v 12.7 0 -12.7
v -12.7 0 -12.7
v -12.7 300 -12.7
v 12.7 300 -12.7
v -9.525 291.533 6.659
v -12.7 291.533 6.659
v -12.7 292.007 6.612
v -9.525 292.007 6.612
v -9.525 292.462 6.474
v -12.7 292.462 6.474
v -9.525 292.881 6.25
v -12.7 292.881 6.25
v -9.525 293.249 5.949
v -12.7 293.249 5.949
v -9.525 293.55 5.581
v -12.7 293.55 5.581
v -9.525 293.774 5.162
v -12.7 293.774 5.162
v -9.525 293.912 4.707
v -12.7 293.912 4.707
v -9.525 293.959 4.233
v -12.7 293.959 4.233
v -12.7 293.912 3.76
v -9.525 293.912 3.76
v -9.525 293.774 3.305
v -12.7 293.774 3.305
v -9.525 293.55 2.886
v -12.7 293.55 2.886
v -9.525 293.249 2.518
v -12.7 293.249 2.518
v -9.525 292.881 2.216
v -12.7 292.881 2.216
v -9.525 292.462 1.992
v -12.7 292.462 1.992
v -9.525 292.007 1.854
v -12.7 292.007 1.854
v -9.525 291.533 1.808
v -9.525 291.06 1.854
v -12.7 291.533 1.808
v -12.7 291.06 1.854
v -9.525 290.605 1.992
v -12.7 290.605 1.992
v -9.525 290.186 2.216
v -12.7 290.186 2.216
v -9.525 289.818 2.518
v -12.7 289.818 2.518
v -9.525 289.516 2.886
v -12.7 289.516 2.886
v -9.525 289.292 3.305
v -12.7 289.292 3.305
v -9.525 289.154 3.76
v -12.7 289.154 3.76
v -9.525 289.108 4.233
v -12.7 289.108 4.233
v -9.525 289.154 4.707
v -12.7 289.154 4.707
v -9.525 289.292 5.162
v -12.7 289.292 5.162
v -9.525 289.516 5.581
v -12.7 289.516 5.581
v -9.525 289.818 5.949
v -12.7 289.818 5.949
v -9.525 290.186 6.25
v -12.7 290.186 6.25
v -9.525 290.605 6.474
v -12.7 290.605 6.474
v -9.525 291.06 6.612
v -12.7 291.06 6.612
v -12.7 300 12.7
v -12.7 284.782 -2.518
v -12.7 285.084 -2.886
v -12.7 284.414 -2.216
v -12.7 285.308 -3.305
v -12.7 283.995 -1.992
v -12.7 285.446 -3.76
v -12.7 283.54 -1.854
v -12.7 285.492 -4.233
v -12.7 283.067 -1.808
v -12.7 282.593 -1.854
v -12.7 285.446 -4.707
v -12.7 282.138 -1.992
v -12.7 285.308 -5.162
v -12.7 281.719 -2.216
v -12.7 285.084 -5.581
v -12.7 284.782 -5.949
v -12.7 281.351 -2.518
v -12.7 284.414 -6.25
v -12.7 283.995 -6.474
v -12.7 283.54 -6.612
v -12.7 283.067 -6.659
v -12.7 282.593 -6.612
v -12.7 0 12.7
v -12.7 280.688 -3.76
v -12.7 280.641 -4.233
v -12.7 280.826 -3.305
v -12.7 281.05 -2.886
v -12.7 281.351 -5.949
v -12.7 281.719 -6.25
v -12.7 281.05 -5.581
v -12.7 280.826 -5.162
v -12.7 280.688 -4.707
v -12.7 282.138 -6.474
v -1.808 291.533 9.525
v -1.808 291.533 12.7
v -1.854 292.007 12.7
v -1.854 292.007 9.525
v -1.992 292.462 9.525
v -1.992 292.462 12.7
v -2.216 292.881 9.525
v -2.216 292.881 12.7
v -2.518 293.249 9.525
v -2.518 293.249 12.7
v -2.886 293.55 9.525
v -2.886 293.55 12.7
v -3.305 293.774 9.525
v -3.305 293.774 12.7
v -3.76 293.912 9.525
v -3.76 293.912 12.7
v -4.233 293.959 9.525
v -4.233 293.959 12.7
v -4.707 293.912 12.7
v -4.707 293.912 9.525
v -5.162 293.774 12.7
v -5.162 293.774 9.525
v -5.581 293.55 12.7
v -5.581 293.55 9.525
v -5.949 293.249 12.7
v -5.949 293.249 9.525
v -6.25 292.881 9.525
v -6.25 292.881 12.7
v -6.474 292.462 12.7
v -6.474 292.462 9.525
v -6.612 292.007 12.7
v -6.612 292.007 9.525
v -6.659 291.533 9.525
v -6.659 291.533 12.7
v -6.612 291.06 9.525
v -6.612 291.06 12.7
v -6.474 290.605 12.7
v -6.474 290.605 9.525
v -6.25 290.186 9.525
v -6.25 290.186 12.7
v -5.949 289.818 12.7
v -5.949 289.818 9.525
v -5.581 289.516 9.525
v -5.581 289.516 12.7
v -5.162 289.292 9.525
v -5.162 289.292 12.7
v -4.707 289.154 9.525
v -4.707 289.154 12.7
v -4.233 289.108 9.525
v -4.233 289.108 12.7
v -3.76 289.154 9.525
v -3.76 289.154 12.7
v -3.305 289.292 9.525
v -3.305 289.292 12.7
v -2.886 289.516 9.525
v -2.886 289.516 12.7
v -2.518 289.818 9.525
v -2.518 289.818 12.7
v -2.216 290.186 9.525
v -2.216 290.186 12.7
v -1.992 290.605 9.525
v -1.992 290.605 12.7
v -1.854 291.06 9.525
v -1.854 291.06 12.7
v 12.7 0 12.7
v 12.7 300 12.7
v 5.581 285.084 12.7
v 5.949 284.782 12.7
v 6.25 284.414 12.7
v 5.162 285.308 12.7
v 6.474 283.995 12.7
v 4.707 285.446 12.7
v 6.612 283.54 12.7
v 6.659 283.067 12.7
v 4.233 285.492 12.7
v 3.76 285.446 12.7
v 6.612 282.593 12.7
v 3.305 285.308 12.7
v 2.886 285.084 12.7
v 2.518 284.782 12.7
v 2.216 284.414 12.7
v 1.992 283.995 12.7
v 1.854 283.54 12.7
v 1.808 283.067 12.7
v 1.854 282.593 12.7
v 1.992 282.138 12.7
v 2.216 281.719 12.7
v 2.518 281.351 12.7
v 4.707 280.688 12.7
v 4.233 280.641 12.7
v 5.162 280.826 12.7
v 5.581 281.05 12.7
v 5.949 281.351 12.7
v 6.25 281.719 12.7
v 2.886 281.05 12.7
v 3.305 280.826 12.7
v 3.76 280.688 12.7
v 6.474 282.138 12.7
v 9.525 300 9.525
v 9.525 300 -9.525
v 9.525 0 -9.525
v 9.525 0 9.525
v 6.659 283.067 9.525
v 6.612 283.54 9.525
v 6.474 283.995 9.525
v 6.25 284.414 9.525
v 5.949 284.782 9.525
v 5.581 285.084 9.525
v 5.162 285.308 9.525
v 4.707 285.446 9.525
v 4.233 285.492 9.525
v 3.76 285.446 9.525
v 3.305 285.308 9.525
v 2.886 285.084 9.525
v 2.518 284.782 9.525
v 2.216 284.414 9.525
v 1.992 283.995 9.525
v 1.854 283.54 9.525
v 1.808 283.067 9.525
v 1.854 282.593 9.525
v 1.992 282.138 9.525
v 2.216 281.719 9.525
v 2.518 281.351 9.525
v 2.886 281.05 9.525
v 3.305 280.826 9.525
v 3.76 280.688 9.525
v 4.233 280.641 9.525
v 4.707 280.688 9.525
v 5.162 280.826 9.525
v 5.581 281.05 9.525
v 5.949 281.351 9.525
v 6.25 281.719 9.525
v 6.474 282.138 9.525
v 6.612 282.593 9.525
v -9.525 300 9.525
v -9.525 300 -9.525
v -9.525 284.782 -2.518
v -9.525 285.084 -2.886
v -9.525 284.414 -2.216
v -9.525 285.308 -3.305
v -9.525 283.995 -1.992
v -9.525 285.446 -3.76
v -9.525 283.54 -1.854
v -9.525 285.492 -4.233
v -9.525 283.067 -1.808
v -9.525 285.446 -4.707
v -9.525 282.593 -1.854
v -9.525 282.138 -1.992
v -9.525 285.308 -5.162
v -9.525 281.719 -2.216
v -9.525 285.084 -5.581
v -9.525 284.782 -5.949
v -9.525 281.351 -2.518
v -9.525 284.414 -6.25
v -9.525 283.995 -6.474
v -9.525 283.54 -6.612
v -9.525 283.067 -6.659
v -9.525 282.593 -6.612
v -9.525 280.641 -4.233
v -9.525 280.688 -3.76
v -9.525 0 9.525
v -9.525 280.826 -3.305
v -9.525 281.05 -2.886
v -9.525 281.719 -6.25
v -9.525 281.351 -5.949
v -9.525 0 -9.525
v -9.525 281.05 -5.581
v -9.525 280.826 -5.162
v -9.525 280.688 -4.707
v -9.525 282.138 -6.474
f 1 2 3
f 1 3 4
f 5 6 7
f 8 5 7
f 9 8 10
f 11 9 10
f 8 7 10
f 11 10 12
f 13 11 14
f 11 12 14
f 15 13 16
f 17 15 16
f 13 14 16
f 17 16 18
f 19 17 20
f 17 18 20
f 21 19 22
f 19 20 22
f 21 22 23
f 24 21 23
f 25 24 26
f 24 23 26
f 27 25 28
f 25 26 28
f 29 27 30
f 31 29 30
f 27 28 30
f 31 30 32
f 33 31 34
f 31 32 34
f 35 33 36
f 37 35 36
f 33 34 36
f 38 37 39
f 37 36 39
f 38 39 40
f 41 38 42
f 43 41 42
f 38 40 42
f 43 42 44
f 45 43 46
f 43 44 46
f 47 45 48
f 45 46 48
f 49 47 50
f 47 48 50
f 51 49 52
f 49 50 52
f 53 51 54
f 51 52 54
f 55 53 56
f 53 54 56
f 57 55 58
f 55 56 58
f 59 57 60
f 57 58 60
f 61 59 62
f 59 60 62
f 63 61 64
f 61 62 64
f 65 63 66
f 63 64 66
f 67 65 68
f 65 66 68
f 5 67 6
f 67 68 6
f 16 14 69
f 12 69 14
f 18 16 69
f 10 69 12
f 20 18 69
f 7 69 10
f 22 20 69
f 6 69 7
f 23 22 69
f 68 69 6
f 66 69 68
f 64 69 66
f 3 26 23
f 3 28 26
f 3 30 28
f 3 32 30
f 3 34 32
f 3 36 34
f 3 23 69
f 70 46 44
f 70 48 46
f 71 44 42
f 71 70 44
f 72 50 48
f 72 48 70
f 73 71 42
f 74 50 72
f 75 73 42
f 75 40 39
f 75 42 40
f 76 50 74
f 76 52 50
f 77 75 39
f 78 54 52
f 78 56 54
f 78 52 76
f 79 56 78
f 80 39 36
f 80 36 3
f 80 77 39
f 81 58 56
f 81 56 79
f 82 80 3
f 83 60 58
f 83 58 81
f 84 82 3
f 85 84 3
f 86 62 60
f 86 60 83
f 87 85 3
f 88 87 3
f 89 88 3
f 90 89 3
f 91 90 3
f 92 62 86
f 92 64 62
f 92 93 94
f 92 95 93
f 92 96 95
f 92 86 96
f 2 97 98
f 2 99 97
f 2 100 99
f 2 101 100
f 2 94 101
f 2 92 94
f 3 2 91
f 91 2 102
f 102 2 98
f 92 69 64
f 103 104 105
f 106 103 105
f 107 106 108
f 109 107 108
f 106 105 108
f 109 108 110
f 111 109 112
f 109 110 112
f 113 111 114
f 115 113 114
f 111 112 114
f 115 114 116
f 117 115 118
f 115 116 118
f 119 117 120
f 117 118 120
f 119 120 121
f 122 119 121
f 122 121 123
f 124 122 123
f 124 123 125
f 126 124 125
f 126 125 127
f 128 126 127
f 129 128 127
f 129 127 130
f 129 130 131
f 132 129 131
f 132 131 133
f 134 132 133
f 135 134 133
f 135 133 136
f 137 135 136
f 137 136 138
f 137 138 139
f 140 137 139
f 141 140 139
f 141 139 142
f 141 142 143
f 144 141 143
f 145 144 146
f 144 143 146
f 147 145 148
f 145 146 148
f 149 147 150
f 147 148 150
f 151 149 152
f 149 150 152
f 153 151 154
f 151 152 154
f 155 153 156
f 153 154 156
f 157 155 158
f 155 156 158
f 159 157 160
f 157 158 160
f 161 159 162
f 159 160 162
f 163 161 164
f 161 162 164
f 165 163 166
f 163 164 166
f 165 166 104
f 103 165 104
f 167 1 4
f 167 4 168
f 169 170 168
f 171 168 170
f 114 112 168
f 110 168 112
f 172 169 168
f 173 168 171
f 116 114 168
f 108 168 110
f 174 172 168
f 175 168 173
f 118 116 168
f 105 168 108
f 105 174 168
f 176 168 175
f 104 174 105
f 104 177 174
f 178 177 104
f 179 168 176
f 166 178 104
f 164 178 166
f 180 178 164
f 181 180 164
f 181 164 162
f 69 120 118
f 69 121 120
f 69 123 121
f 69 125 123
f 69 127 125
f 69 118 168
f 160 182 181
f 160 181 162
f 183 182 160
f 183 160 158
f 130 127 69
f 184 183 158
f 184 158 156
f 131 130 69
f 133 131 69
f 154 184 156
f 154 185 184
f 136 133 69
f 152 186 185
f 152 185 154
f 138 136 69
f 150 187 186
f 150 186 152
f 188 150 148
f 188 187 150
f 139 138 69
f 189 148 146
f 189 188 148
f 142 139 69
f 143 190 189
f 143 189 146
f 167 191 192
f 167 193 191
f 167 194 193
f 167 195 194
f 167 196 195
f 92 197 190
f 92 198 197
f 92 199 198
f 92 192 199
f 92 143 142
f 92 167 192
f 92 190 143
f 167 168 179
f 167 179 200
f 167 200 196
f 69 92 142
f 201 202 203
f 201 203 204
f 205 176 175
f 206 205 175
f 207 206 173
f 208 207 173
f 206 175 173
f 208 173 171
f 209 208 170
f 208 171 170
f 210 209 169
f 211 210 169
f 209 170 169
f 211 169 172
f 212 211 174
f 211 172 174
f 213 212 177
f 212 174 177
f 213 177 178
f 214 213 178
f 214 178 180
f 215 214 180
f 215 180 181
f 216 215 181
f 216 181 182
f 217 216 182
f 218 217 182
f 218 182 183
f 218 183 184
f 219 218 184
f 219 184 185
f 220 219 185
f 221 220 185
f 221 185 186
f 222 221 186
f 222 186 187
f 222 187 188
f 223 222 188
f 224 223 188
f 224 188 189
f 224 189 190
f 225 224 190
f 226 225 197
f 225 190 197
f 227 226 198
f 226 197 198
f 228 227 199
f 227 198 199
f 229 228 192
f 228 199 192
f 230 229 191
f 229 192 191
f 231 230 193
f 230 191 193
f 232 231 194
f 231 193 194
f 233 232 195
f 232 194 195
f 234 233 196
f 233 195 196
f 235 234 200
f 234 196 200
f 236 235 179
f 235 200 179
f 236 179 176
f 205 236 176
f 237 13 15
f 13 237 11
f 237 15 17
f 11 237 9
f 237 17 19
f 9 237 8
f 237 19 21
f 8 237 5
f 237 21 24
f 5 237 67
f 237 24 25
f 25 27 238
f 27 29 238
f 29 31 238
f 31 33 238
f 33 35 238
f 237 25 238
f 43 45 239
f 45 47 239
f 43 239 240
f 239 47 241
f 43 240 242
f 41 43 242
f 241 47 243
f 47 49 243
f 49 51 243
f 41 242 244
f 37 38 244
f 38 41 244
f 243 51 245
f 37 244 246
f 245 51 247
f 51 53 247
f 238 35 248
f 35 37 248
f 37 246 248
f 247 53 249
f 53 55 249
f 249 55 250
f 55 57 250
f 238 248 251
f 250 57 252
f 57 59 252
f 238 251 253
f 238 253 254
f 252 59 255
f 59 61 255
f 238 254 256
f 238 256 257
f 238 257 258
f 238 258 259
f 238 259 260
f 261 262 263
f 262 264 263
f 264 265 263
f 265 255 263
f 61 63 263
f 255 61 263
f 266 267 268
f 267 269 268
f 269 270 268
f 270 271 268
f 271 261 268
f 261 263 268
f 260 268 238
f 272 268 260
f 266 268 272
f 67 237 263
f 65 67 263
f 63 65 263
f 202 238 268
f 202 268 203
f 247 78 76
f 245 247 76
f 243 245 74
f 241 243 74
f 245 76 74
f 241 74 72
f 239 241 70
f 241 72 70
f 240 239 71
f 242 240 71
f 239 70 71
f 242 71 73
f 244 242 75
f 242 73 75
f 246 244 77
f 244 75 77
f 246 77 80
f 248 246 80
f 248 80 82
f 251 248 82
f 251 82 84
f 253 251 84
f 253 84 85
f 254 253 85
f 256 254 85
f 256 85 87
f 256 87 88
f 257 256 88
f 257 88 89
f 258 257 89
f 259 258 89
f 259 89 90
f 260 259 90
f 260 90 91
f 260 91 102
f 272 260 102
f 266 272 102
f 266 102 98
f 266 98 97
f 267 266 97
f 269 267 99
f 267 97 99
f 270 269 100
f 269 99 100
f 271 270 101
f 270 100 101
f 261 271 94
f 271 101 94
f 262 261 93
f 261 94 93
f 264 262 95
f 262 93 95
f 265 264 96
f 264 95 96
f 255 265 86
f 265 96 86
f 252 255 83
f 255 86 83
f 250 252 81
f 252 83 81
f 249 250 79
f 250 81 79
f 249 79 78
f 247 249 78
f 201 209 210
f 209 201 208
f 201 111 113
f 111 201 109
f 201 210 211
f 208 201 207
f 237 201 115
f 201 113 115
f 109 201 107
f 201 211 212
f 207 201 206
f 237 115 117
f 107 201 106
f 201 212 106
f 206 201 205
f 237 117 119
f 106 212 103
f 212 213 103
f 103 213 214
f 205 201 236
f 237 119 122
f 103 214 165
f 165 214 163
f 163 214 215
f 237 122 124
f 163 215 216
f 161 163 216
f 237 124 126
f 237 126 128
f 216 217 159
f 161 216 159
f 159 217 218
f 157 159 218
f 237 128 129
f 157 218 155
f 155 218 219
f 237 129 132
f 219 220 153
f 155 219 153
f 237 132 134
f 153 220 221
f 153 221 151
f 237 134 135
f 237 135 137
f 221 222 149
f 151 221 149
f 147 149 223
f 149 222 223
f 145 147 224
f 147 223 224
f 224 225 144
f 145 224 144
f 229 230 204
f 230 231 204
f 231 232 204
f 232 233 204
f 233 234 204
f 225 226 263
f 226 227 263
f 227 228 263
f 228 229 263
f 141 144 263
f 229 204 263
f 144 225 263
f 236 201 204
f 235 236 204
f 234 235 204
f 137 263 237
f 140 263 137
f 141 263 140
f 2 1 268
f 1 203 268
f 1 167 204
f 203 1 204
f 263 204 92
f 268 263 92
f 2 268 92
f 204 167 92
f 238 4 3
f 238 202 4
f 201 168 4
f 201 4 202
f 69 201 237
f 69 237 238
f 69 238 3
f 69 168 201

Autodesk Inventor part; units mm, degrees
ref_plane "YZ Plane" through (0, 0, 0) normal (1, 0, 0) x (0, 1, 0)
ref_plane "XZ Plane" through (0, 0, 0) normal (0, 1, 0) x (-1, 0, 0)
ref_plane "XY Plane" through (0, 0, 0) normal (0, 0, 1) x (1, 0, 0)
sketch "Sketch1" plane through (0, 0, 0) normal (0, 1, 0) x (-1, 0, 0)
  line L0 (12.7, -12.7) -> (-12.7, -12.7)
  line L1 (-12.7, -12.7) -> (-12.7, 12.7)
  line L2 (-12.7, 12.7) -> (12.7, 12.7)
  line L3 (12.7, 12.7) -> (12.7, -12.7)
  line L4 (9.525, -9.525) -> (-9.525, -9.525)
  line L5 (-9.525, -9.525) -> (-9.525, 9.525)
  line L6 (-9.525, 9.525) -> (9.525, 9.525)
  line L7 (9.525, 9.525) -> (9.525, -9.525)
  point P0 (0, 0)
  point P1 (0, -9.525)
  point P2 (0, -12.7)
  point P3 (-9.525, 0)
  point P4 (-12.7, 0)
  dimension "d0" = 25.4
  dimension "d1" = 3.175
extrude "Extrusion1" add sketch "Sketch1" along normal blind 300
sketch "Sketch2" plane through (-12.7, 0, 12.7) normal (0, 0, 1) x (1, 0, 0)
  line L0 (0, 0) -> (0, 300) construction
  line L1 (0, 300) -> (25.4, 300) construction
  line L2 (25.4, 300) -> (25.4, 274.6) construction
  line L3 (25.4, 274.6) -> (0, 274.6) construction
  line L4 (0, 274.6) -> (0, 300) construction
  line L5 (25.4, 0) -> (25.4, 300) construction
  line L6 (8.4667, 291.5333) -> (16.9333, 291.5333) construction
  line L7 (16.9333, 291.5333) -> (16.9333, 283.0667) construction
  line L8 (16.9333, 283.0667) -> (8.4667, 283.0667) construction
  line L9 (8.4667, 283.0667) -> (8.4667, 291.5333) construction
  circle A0 centre (8.4667, 291.5333) radius 2.4257
  circle A1 centre (16.9333, 283.0667) radius 2.4257
  point P0 (12.7, 0)
  point P1 (12.7, 291.5333)
  point P2 (12.7, 300)
  point P3 (16.9333, 287.3)
  point P4 (25.4, 287.3)
  dimension "d4" = 8.4667
  dimension "d5" = 4.8514
sketch "Sketch3" plane through (-12.7, 0, -12.7) normal (-1, 0, 0) x (0, 0, 1)
  line L0 (0, 0) -> (0, 300) construction
  line L1 (0, 300) -> (25.4, 300) construction
  line L2 (25.4, 300) -> (25.4, 274.6) construction
  line L3 (25.4, 274.6) -> (0, 274.6) construction
  line L4 (0, 274.6) -> (0, 300) construction
  line L5 (8.4667, 291.5333) -> (16.9333, 291.5333) construction
  line L6 (16.9333, 291.5333) -> (16.9333, 283.0667) construction
  line L7 (16.9333, 283.0667) -> (8.4667, 283.0667) construction
  line L8 (8.4667, 283.0667) -> (8.4667, 291.5333) construction
  circle A0 centre (16.9333, 291.5333) radius 2.4257
  circle A1 centre (8.4667, 283.0667) radius 2.4257
  point P0 (12.7, 0)
  point P1 (16.9333, 287.3)
  point P2 (25.4, 287.3)
  point P3 (12.7, 283.0667)
  point P4 (12.7, 274.6)
  dimension "d6" = 25.4
  dimension "d7" = 8.4667
  dimension "d8" = 4.8514
extrude "Extrusion2" cut sketch "Sketch3" against normal blind 3.175
extrude "Extrusion3" cut sketch "Sketch2" against normal blind 3.175
properties part number "vertical"
